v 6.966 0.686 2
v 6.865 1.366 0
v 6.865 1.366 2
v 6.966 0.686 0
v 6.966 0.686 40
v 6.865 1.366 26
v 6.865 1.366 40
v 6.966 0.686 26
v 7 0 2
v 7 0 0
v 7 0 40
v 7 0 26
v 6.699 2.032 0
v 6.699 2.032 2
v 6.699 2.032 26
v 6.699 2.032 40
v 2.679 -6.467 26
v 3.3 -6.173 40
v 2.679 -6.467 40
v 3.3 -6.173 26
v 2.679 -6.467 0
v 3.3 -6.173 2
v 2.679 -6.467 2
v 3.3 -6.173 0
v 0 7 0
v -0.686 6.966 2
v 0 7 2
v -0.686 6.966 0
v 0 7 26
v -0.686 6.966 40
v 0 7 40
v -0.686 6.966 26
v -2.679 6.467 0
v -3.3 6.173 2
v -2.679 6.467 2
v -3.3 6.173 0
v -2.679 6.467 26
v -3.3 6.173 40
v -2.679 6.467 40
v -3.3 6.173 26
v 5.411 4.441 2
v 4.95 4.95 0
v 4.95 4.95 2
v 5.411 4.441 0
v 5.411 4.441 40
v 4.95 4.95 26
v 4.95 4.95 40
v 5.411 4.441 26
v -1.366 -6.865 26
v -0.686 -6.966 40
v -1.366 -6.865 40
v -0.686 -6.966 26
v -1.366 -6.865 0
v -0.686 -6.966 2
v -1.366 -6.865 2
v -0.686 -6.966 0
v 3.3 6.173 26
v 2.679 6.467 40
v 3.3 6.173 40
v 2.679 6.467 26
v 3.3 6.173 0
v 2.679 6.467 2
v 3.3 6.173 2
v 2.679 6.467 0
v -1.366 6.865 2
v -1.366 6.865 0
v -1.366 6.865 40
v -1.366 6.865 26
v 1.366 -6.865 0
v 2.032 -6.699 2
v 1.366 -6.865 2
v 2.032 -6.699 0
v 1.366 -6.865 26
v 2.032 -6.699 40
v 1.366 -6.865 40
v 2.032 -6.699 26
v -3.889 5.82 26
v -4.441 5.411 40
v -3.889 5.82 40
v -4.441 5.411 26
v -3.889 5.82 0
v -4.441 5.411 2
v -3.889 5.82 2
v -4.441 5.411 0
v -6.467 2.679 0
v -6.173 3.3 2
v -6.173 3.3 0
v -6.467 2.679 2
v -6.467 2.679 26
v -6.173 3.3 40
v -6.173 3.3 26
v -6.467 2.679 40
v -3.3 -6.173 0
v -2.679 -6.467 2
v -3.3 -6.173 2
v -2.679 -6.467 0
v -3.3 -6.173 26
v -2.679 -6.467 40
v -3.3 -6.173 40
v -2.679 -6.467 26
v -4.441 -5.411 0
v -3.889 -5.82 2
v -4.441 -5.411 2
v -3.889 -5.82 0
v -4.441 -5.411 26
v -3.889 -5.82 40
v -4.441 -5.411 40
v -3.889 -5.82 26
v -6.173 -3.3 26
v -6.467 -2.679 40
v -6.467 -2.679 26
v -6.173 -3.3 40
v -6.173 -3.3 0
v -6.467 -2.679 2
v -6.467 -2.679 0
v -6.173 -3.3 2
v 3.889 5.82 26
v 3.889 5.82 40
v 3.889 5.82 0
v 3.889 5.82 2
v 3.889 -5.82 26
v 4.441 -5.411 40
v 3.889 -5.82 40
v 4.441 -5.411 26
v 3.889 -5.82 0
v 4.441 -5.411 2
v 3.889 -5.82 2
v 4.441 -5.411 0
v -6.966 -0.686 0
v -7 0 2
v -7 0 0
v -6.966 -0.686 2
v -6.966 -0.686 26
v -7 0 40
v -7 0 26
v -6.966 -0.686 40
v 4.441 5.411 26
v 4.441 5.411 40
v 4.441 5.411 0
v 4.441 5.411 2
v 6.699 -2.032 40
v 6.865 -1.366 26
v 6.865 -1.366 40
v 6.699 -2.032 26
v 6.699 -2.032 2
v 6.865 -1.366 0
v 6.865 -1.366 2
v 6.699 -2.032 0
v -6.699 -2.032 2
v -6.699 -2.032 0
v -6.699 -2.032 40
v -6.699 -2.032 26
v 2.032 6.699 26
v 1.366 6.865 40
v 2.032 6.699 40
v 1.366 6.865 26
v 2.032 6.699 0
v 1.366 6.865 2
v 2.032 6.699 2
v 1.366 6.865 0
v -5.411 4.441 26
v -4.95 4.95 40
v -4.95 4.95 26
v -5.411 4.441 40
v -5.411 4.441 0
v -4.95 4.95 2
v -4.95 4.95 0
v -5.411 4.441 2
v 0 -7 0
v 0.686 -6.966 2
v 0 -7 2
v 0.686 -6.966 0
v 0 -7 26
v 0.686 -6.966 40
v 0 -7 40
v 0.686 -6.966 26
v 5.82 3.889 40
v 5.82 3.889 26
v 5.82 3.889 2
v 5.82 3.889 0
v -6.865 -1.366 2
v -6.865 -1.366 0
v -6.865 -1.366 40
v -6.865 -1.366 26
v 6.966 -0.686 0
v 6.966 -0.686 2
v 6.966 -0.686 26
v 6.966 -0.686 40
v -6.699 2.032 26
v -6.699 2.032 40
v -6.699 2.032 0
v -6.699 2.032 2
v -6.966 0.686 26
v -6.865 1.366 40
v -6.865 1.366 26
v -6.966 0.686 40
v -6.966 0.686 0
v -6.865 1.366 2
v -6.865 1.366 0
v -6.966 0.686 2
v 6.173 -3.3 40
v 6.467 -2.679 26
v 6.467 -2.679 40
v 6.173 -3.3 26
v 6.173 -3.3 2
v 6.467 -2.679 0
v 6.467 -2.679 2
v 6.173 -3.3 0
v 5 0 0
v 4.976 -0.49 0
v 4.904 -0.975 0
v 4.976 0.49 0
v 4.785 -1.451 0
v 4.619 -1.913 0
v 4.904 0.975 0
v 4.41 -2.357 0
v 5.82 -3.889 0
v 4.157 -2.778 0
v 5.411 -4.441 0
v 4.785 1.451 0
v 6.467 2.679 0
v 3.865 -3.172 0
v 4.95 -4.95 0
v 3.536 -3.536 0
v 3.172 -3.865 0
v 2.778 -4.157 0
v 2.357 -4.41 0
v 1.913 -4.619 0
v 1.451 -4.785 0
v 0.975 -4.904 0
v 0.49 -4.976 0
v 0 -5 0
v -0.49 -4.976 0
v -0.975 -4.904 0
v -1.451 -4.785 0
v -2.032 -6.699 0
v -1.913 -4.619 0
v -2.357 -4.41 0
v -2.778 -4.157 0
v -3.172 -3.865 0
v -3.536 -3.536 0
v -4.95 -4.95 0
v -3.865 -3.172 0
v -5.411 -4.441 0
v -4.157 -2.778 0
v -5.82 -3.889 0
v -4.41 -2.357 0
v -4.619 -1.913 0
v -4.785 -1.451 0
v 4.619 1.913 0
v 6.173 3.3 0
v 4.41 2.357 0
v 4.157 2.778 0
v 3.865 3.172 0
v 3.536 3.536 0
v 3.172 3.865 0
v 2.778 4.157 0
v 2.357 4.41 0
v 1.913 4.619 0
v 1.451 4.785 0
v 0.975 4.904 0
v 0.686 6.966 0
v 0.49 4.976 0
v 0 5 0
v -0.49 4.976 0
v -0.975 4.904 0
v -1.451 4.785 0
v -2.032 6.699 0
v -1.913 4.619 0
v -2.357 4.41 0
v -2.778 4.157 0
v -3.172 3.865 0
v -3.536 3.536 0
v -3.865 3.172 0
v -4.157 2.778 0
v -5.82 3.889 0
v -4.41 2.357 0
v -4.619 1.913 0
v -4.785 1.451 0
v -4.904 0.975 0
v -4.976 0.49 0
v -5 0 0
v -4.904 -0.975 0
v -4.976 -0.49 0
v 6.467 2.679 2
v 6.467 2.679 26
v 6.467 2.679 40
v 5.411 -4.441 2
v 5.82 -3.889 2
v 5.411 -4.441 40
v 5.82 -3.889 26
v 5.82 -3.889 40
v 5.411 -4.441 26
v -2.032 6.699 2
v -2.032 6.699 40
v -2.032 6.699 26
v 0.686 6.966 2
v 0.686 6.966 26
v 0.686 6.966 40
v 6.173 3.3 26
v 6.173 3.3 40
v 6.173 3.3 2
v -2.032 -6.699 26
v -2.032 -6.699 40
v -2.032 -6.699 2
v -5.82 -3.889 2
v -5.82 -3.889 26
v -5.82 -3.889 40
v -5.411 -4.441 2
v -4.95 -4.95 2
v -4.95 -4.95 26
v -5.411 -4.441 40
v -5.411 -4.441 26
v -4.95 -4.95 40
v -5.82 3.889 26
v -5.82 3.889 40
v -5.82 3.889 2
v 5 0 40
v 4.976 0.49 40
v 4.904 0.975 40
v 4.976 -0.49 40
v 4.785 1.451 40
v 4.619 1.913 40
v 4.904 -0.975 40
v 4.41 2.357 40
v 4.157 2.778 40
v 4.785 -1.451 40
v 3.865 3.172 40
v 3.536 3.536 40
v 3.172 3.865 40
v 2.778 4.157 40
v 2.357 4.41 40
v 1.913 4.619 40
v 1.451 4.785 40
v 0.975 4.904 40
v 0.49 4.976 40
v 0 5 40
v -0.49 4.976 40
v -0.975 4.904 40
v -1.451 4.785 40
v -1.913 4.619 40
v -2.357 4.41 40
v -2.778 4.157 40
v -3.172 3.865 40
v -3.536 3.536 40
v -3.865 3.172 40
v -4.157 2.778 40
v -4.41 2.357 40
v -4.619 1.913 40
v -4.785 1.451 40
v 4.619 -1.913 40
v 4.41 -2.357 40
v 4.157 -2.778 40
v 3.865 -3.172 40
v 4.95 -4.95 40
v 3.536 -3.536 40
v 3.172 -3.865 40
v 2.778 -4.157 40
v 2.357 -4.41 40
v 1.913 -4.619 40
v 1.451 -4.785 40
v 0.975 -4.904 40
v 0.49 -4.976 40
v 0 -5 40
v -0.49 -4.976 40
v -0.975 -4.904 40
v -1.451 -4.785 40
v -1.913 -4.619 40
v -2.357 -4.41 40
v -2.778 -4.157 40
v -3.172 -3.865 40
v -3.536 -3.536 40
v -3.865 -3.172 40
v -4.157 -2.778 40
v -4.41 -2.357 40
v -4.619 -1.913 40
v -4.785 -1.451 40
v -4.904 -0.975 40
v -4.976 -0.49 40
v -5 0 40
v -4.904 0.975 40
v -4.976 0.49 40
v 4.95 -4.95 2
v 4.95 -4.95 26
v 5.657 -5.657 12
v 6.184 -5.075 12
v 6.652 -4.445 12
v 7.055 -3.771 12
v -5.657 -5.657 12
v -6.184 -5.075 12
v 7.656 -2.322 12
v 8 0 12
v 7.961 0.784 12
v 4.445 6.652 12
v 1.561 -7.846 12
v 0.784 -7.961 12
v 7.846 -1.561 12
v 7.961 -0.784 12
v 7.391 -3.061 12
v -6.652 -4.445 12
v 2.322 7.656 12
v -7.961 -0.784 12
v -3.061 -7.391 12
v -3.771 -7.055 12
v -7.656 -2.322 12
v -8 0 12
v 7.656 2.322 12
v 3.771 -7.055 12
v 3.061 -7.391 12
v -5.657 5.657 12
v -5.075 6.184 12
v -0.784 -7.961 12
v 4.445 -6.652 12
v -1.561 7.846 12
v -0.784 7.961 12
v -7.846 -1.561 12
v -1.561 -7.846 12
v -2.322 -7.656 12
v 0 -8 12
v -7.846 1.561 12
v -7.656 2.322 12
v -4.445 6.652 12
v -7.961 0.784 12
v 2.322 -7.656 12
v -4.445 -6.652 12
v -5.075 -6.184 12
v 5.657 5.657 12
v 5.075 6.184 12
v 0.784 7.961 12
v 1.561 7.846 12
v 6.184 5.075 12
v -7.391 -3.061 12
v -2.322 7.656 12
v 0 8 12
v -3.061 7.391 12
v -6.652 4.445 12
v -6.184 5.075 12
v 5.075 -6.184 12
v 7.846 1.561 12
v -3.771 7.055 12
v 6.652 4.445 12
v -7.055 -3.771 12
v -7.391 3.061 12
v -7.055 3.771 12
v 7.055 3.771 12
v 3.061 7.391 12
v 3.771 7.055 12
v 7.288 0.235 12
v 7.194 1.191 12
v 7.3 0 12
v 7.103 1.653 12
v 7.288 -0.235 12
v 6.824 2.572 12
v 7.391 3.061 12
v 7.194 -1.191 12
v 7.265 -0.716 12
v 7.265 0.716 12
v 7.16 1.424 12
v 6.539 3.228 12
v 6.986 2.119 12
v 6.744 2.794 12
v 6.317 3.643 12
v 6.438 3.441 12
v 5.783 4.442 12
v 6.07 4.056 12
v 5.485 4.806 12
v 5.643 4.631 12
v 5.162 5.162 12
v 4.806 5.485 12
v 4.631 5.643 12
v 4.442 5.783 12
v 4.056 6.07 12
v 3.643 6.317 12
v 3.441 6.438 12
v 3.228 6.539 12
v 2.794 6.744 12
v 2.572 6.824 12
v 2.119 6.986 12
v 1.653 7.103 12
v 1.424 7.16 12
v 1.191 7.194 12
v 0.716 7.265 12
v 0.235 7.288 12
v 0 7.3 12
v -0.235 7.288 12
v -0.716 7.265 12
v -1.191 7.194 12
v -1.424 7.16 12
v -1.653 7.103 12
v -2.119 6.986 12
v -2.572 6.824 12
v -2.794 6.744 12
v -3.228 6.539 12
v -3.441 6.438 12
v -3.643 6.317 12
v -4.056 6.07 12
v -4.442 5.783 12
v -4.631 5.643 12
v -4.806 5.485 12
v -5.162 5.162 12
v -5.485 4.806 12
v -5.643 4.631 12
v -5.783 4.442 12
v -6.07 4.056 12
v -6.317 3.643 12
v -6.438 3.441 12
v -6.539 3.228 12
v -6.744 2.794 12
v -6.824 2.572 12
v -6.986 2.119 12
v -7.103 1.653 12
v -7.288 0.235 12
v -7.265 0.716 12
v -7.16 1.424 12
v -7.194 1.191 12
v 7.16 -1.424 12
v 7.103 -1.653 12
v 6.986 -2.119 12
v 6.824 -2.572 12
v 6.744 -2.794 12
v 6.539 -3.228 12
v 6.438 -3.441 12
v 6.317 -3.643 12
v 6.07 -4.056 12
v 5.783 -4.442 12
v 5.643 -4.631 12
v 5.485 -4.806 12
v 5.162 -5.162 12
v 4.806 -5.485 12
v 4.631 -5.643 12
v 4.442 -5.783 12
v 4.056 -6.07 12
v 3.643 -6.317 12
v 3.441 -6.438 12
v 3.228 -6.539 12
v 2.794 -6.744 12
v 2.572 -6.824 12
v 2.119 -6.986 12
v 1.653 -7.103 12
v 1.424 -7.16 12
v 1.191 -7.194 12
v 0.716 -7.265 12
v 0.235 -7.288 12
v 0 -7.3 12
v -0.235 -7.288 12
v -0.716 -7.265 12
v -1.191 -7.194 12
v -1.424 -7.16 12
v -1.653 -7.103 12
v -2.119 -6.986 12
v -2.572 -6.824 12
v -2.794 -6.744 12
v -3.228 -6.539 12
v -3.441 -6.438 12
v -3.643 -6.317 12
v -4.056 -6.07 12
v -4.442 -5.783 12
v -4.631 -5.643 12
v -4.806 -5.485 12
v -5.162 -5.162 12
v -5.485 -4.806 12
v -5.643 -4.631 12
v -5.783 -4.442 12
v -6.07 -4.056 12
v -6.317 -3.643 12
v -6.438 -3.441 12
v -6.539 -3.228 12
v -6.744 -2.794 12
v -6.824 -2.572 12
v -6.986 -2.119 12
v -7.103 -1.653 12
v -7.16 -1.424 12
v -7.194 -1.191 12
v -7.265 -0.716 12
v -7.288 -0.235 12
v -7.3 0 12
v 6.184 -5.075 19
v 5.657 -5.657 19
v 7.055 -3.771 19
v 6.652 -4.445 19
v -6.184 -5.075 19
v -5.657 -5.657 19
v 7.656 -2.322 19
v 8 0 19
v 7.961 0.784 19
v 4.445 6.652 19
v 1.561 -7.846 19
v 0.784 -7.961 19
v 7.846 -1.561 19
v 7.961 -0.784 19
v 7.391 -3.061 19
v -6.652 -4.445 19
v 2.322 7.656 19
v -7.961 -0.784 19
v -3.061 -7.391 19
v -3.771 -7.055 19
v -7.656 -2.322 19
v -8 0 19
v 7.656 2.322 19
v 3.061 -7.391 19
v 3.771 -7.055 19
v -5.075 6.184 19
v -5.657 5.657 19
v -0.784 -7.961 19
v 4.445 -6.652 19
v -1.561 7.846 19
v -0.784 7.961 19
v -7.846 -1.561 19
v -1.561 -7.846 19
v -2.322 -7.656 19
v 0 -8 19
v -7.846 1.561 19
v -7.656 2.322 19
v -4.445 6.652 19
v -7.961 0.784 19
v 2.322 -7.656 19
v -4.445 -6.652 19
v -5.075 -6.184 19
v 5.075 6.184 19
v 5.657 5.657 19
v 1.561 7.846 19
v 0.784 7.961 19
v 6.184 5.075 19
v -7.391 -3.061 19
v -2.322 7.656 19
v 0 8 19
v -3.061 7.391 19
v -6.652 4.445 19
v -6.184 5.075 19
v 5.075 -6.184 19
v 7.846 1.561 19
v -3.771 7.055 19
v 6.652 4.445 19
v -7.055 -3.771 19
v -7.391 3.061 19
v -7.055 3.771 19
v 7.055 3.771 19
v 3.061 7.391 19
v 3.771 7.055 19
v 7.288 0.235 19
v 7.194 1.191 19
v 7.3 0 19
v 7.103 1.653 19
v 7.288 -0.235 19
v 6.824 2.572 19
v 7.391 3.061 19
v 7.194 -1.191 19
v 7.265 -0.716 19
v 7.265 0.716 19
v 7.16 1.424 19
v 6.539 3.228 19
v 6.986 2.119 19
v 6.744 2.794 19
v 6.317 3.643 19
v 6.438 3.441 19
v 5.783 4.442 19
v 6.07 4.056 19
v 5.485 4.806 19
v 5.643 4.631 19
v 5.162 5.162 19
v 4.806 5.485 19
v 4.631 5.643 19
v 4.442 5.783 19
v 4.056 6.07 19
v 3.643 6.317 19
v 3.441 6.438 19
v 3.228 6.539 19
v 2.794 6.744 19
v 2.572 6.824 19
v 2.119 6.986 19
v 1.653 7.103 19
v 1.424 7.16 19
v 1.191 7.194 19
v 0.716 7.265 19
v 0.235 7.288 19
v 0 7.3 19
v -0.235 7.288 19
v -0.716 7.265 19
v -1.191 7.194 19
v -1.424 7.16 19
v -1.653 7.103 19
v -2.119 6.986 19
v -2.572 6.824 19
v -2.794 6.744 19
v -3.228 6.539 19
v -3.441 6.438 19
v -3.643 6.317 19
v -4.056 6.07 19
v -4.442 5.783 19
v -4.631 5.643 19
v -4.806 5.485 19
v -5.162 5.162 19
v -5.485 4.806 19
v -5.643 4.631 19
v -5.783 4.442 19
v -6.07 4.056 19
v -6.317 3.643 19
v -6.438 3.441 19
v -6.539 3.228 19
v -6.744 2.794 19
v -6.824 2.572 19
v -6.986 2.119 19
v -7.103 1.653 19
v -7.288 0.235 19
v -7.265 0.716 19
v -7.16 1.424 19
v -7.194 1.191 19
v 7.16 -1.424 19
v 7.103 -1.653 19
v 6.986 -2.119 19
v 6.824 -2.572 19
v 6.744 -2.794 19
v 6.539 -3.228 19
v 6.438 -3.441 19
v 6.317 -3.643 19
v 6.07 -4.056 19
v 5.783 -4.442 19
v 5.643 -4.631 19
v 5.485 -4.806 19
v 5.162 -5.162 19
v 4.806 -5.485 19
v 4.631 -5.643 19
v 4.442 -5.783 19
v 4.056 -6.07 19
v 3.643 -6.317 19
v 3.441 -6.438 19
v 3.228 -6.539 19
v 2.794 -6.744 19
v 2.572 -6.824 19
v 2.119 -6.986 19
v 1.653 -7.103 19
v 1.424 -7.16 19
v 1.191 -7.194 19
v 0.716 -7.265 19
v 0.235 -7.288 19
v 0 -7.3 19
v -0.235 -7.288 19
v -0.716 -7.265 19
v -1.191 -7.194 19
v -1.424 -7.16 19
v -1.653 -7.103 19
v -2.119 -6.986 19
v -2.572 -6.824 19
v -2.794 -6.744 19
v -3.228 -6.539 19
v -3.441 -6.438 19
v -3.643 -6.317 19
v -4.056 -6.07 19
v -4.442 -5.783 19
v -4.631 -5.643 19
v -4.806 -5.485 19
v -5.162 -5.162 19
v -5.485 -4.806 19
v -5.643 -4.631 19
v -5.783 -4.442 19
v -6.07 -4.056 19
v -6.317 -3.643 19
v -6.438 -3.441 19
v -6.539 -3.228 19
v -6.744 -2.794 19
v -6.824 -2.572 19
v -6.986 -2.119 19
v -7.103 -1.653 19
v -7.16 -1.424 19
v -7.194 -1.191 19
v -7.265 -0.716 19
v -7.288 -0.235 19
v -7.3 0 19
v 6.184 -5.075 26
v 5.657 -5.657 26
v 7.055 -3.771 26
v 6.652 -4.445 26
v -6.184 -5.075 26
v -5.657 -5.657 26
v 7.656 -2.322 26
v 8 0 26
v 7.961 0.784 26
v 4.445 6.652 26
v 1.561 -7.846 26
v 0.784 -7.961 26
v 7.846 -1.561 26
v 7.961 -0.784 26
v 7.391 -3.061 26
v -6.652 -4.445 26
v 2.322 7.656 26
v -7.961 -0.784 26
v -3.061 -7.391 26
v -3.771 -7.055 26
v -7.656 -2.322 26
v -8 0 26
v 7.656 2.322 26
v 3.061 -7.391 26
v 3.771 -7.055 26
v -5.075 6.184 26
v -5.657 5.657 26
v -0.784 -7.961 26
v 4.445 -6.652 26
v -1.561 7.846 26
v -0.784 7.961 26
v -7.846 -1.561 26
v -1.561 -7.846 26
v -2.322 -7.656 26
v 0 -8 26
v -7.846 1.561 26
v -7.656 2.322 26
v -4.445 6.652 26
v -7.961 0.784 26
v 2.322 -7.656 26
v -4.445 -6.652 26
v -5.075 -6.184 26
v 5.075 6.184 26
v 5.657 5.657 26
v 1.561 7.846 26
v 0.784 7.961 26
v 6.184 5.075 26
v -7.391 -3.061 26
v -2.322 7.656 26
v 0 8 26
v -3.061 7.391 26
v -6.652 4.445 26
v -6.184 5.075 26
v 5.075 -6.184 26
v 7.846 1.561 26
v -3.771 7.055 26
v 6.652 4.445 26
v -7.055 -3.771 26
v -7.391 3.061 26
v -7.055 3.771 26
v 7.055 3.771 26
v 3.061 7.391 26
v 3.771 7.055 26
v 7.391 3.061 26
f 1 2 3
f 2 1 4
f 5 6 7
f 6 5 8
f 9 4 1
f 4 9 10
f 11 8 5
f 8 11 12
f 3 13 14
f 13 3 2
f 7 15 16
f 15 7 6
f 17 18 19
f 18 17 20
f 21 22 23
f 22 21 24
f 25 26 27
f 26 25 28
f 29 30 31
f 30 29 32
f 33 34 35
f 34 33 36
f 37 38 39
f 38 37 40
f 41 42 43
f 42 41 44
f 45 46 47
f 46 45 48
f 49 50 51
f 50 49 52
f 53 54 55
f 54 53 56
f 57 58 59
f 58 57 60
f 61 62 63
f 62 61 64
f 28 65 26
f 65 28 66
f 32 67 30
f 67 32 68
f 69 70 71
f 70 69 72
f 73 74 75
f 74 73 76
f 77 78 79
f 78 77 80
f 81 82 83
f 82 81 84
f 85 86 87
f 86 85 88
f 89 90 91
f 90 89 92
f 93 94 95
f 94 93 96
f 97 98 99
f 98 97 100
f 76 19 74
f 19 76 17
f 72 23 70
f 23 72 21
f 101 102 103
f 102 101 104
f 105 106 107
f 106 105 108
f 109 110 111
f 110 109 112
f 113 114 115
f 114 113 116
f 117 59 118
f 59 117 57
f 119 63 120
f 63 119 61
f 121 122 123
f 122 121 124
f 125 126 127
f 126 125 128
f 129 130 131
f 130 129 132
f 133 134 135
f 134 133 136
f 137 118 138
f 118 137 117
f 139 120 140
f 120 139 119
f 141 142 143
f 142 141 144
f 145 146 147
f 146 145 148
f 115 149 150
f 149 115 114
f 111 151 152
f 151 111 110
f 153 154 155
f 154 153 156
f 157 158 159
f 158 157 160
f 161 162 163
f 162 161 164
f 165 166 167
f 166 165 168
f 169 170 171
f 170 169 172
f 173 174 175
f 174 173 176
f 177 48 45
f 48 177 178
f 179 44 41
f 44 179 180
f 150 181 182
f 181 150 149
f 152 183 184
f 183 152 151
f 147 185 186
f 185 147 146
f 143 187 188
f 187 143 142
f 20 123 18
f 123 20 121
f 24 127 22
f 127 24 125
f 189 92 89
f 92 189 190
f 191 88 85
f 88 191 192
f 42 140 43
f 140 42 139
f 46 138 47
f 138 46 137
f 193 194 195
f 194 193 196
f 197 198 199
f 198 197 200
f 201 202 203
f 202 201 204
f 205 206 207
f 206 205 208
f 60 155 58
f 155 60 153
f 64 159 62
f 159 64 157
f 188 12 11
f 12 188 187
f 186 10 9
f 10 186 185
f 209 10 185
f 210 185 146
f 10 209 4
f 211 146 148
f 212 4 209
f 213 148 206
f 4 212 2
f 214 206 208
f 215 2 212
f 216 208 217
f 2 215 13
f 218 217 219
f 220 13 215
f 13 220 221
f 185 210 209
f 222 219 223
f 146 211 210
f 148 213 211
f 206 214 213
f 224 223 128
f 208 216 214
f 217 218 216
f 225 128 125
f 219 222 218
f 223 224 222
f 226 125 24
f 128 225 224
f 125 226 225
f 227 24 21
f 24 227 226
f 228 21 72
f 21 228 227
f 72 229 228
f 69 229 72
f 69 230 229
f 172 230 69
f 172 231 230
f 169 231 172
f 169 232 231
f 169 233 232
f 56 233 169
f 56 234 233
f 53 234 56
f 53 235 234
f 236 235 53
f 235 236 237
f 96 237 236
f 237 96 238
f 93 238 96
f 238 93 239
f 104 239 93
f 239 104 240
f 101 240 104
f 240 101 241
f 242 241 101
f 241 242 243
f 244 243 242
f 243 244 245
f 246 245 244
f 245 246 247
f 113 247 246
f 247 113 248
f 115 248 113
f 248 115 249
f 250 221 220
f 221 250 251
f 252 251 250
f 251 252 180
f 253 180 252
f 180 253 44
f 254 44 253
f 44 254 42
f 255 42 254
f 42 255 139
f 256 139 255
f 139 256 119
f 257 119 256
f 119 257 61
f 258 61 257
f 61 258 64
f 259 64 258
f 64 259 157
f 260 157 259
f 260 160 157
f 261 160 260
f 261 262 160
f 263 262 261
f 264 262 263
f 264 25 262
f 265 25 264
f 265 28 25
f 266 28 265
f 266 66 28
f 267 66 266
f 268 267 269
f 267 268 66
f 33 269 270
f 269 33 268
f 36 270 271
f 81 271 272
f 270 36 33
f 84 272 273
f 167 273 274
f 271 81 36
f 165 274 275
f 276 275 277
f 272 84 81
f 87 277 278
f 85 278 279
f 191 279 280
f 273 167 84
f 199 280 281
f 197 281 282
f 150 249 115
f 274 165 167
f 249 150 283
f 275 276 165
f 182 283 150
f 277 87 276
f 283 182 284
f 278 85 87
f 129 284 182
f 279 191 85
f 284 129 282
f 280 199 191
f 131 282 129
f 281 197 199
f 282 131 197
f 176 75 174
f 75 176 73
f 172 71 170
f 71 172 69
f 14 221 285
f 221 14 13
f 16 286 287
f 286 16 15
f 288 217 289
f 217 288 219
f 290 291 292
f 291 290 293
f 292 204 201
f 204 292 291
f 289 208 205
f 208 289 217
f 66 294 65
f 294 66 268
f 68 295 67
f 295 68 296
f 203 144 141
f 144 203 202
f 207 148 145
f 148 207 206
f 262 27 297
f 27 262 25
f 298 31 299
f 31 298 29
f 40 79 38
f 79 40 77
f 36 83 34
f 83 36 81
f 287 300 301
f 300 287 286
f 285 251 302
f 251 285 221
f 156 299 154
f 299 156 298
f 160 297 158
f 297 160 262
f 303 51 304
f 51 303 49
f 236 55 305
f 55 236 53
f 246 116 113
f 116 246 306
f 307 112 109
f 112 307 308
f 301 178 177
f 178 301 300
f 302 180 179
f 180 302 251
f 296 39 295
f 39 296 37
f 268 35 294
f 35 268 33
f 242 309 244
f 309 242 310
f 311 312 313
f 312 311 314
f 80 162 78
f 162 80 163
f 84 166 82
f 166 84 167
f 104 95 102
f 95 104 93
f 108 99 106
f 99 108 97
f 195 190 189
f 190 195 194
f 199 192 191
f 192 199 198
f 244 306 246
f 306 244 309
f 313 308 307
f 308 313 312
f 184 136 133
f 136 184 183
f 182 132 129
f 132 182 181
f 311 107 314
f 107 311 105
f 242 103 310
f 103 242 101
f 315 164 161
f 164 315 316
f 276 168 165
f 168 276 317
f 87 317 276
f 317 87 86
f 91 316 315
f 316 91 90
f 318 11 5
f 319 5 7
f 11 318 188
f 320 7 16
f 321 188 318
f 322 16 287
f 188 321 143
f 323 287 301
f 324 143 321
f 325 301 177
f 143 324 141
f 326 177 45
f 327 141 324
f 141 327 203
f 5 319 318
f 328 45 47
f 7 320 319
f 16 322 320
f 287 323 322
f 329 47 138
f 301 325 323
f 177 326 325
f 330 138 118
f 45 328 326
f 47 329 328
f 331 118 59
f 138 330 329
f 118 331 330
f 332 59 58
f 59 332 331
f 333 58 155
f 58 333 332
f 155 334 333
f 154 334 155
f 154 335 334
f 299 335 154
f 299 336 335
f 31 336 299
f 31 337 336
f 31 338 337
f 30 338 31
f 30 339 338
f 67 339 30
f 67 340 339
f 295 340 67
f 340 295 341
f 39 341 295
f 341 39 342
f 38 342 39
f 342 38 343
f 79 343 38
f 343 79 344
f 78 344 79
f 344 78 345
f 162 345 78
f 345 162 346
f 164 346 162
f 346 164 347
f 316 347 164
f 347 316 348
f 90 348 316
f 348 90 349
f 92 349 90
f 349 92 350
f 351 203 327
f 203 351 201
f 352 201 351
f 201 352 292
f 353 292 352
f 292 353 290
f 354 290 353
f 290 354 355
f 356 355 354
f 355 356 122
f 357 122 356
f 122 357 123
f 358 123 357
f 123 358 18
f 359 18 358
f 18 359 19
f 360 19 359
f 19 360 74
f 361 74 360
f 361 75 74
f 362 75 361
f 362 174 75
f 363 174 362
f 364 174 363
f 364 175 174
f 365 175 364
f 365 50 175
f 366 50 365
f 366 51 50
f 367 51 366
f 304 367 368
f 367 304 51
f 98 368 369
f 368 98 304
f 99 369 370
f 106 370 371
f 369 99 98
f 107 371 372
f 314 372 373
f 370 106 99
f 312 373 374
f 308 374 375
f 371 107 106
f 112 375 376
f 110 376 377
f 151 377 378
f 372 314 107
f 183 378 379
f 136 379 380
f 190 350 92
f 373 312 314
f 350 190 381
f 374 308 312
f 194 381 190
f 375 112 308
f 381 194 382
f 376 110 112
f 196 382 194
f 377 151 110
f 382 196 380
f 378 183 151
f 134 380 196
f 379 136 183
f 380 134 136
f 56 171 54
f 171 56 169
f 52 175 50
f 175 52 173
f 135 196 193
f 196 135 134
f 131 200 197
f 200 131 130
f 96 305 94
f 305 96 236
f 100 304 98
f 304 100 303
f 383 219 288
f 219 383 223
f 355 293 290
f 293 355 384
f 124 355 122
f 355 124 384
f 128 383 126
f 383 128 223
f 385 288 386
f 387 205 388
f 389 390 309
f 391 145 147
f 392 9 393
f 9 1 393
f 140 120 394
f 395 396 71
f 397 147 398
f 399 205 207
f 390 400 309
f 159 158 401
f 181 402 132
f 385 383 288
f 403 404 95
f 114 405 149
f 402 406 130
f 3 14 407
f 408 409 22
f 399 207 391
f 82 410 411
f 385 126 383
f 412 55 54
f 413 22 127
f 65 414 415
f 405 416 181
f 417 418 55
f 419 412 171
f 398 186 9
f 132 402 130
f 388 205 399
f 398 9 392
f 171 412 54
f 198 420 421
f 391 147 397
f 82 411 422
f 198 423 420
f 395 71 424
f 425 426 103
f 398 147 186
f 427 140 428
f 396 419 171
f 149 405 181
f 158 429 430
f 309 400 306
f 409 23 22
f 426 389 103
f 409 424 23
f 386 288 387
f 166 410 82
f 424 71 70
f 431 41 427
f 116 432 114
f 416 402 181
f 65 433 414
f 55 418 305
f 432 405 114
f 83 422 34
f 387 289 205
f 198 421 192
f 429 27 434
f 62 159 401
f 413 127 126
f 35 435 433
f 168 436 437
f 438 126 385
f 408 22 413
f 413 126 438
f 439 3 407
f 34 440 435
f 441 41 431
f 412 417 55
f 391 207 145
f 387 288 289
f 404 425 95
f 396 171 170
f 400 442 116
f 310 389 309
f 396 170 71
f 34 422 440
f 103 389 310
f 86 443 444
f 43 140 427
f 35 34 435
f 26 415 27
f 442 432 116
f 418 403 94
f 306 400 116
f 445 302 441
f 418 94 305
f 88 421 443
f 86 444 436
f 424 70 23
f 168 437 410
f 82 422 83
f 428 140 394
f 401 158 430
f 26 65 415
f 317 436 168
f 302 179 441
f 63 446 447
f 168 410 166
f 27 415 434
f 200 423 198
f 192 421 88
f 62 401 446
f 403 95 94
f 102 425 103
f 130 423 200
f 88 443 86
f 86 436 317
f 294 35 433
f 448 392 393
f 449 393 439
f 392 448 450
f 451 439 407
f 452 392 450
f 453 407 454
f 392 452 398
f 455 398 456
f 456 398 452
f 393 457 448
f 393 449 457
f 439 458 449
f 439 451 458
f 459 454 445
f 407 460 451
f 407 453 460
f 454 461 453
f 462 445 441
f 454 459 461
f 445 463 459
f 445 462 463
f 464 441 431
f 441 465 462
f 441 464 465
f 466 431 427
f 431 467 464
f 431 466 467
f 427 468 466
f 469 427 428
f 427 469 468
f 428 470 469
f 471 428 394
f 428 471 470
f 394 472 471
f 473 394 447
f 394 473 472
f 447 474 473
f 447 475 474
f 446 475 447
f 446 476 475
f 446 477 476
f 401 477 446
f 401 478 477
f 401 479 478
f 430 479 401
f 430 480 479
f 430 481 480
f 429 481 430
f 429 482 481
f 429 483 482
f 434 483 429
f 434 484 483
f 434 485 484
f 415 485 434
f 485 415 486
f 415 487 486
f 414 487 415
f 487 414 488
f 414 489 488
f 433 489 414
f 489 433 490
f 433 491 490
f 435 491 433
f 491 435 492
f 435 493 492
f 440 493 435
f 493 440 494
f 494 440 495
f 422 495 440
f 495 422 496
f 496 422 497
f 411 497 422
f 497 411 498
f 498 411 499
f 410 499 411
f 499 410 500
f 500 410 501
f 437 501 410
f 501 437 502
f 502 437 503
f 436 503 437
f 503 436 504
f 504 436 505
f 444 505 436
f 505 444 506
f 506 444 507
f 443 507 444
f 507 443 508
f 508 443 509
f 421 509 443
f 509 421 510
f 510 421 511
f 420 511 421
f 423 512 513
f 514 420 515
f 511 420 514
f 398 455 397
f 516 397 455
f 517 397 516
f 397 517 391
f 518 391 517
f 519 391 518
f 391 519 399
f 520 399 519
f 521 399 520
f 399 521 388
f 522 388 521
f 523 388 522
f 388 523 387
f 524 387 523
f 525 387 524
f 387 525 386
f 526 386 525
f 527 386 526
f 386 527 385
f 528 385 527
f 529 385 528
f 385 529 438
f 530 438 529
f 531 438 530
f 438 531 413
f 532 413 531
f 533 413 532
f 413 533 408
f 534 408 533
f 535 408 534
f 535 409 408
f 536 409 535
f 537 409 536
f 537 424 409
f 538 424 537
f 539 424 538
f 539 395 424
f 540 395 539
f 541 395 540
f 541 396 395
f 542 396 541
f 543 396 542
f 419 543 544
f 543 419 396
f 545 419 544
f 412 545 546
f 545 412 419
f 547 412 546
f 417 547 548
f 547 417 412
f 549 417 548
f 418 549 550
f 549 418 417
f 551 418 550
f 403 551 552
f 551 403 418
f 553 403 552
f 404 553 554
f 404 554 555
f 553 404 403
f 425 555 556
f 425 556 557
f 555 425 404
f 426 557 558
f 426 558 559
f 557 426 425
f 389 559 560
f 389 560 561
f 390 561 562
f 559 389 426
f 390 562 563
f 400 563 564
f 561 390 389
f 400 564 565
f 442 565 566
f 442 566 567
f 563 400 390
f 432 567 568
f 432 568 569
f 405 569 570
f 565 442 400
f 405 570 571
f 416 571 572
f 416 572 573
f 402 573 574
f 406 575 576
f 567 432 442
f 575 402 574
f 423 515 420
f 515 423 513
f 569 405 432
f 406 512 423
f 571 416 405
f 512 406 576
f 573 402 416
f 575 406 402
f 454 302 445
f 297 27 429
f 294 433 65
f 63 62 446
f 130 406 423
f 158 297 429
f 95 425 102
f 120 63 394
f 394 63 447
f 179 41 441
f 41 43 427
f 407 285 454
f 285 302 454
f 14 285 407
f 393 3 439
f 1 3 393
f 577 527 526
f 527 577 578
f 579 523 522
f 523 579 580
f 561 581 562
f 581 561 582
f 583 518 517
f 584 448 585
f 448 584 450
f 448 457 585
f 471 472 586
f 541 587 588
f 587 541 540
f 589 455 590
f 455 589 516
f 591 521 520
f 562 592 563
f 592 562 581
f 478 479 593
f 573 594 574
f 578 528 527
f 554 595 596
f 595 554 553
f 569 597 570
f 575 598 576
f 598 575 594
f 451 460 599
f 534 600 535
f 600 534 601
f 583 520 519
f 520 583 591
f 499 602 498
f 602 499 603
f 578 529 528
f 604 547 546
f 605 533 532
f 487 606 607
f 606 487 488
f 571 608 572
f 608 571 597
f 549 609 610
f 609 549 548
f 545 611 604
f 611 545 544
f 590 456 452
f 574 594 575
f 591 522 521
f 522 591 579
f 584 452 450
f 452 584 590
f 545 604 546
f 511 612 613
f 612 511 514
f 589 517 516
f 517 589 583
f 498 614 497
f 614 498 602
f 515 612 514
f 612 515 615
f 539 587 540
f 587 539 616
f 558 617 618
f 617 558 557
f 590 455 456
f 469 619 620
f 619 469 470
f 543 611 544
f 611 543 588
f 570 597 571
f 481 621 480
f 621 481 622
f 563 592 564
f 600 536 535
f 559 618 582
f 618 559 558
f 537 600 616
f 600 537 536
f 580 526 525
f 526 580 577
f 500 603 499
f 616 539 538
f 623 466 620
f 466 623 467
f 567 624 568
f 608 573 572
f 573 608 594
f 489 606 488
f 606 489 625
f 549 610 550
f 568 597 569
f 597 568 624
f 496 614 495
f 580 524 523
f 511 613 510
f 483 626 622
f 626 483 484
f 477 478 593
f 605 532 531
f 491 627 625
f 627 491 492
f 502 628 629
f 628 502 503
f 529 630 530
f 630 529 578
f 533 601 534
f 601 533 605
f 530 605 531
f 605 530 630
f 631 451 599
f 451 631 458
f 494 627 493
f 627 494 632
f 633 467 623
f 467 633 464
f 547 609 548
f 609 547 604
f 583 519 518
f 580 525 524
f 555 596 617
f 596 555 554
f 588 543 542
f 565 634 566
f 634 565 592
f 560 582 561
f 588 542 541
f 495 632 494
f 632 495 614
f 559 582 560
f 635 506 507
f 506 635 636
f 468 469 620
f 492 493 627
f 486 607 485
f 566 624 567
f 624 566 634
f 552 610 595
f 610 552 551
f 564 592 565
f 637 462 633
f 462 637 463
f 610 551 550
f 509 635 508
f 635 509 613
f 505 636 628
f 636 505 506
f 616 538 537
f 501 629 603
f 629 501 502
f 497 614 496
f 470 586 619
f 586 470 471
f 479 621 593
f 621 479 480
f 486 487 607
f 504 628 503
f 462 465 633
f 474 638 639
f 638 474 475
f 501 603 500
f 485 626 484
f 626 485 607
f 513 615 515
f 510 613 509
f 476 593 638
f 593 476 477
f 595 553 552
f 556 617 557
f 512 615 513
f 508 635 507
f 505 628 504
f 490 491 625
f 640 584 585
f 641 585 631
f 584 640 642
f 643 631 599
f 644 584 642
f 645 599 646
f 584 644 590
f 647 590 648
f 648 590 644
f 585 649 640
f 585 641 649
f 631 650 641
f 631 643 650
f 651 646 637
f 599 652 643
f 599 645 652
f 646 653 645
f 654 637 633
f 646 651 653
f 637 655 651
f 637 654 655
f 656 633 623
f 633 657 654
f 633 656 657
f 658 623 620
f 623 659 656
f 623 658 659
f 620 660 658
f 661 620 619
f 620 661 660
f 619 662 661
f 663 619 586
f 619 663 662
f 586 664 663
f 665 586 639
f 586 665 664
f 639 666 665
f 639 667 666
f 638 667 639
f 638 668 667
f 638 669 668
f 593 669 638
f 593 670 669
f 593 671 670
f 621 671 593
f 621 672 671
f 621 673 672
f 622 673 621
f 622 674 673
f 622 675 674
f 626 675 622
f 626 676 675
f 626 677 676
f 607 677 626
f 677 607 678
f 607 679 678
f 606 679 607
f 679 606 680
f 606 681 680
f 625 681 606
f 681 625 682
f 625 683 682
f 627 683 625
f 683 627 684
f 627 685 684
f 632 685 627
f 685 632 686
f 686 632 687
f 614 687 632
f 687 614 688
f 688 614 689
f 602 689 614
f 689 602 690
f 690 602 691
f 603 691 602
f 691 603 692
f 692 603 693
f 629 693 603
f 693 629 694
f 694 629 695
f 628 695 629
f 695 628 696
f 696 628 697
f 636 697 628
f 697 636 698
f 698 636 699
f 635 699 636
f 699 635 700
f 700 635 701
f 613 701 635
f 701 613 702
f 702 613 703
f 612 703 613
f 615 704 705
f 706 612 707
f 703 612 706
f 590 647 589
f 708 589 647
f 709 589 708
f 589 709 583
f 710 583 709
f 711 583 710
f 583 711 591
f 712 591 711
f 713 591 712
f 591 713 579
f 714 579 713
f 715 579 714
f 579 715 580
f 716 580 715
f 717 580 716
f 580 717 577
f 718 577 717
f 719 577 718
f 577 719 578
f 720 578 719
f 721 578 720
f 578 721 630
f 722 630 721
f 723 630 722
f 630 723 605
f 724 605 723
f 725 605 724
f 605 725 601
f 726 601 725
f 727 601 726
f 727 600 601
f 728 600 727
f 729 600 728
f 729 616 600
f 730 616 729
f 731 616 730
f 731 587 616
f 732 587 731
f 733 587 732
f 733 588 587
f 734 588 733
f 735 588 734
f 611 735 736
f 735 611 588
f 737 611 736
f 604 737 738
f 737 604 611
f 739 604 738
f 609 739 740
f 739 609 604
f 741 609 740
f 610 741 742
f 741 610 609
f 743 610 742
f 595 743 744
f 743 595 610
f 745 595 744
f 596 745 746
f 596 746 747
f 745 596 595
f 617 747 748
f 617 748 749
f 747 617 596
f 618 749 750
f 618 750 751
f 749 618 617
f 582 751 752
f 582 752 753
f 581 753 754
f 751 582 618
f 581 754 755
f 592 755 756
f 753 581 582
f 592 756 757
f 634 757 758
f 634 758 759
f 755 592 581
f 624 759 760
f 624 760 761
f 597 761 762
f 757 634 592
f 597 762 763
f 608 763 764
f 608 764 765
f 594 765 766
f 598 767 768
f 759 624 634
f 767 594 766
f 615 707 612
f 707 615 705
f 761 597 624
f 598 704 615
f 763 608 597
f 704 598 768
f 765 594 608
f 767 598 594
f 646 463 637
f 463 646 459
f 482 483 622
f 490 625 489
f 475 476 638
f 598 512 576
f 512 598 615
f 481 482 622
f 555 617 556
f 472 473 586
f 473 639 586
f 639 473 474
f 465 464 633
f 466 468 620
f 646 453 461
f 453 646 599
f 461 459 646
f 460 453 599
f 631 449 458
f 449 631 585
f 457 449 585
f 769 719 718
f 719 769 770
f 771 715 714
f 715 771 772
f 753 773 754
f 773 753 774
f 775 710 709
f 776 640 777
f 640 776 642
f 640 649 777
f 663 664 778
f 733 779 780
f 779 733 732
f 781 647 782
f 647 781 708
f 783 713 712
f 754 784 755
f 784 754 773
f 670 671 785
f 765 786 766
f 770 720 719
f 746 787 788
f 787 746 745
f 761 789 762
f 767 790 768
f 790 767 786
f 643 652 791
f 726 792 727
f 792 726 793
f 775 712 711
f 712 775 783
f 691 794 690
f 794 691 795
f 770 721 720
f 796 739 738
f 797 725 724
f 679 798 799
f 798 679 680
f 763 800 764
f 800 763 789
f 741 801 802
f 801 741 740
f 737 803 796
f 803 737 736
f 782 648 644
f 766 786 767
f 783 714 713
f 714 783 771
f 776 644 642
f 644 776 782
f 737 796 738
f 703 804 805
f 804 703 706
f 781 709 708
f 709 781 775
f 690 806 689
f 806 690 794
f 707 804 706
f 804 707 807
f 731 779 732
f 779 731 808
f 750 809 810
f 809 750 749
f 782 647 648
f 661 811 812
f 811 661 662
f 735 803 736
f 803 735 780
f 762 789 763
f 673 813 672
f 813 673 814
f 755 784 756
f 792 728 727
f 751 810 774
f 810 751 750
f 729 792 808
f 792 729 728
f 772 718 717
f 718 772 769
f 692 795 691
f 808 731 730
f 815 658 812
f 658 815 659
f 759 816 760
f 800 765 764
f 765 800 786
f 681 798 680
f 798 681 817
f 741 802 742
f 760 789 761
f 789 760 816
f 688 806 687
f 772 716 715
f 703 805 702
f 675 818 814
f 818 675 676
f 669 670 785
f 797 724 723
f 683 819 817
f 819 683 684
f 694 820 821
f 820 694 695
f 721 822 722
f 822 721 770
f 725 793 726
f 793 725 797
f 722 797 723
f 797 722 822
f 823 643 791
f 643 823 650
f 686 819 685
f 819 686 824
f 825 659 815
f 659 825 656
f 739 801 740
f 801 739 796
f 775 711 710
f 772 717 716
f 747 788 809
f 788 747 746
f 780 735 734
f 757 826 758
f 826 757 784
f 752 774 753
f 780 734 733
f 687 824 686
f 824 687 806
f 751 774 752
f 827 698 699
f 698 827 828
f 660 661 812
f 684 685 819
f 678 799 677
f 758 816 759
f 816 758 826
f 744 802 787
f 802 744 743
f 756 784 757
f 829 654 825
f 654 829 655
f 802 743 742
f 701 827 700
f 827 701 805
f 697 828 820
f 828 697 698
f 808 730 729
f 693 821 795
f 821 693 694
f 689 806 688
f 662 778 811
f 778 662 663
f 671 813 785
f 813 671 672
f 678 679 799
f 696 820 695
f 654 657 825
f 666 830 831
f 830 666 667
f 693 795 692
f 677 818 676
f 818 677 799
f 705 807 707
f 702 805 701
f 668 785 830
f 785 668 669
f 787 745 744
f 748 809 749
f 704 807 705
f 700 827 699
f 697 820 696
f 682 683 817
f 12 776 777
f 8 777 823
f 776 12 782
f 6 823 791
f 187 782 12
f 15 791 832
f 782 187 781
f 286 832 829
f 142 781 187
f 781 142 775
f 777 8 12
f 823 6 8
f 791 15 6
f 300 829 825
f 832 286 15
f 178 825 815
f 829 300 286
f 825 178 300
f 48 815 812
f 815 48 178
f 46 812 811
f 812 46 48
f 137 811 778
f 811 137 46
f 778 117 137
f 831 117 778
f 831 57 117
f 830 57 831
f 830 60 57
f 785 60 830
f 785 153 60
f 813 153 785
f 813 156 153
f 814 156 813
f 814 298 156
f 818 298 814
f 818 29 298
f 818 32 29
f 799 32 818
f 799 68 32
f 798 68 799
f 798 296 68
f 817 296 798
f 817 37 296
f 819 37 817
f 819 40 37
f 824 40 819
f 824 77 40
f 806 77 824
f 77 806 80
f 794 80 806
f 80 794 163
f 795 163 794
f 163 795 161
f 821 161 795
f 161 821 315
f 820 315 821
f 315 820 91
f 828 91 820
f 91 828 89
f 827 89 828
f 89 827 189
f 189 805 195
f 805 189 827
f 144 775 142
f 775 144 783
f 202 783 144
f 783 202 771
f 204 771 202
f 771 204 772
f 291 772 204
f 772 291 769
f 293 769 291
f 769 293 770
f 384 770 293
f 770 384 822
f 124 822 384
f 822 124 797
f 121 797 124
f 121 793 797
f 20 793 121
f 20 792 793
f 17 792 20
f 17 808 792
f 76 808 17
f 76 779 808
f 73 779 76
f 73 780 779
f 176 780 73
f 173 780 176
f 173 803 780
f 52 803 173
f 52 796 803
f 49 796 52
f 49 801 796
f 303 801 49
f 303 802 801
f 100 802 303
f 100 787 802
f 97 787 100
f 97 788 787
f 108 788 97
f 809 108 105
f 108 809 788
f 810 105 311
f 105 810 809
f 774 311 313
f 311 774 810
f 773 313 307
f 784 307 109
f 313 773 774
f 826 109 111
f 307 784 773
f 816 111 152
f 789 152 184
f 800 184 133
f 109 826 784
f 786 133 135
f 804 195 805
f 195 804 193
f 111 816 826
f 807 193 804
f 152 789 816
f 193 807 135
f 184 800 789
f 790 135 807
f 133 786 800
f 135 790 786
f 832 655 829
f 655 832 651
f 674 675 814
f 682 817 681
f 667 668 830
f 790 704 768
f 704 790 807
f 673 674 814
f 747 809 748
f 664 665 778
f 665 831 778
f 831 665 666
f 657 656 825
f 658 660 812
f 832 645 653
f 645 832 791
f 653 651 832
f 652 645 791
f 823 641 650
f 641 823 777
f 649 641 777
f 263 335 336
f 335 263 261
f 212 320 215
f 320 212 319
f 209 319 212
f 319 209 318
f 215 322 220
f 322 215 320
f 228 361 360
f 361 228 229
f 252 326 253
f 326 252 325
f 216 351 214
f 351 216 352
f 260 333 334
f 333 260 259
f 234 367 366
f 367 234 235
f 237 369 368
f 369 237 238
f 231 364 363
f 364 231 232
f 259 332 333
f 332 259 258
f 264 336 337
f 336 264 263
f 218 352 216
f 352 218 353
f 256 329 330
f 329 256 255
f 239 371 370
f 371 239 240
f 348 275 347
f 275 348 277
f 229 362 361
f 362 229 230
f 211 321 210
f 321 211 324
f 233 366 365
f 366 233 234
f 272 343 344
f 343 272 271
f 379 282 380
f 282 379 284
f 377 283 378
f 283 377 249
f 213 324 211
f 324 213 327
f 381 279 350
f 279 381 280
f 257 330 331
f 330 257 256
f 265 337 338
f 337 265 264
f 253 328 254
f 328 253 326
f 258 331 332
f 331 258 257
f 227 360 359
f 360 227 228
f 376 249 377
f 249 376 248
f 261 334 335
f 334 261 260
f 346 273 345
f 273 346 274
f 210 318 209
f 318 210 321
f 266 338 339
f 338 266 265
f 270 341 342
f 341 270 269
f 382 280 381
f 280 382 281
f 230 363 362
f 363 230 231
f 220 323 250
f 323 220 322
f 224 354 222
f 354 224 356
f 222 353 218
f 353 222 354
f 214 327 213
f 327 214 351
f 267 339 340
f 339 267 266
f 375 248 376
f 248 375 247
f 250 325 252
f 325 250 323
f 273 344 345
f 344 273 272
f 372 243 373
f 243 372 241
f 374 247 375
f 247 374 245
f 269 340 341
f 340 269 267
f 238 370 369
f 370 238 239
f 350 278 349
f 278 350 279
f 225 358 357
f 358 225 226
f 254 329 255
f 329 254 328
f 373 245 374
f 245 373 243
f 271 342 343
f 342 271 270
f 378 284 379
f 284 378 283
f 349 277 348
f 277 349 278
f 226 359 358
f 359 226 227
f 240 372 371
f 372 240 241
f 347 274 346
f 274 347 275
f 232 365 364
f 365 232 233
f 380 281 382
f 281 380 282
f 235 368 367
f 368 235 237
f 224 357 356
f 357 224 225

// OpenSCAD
//////////////////////////////////////////////////////
// This script generates a nozzle for an aquarium
// pump so that a hose can be connected.
//
// 2017 CC BY-SA by Alexander Fell
//
// version 1
//////////////////////////////////////////////////////


resolution=64;

difference() {
	union() {
		cylinder(h=40, r=7, $fn=resolution);
		stopper(2, 7, 8);
		stopper(9, 7, 8);
		stopper(16, 7, 8);
	}
	translate([0, 0, -0.1]) {
		cylinder(h=41, r=5, $fn=resolution);
	}
}

module stopper(z, ra, rb) {
	translate([0, 0, z]) {
		cylinder(h=10, r1=ra, r2=rb, $fn=resolution);
	}
}
